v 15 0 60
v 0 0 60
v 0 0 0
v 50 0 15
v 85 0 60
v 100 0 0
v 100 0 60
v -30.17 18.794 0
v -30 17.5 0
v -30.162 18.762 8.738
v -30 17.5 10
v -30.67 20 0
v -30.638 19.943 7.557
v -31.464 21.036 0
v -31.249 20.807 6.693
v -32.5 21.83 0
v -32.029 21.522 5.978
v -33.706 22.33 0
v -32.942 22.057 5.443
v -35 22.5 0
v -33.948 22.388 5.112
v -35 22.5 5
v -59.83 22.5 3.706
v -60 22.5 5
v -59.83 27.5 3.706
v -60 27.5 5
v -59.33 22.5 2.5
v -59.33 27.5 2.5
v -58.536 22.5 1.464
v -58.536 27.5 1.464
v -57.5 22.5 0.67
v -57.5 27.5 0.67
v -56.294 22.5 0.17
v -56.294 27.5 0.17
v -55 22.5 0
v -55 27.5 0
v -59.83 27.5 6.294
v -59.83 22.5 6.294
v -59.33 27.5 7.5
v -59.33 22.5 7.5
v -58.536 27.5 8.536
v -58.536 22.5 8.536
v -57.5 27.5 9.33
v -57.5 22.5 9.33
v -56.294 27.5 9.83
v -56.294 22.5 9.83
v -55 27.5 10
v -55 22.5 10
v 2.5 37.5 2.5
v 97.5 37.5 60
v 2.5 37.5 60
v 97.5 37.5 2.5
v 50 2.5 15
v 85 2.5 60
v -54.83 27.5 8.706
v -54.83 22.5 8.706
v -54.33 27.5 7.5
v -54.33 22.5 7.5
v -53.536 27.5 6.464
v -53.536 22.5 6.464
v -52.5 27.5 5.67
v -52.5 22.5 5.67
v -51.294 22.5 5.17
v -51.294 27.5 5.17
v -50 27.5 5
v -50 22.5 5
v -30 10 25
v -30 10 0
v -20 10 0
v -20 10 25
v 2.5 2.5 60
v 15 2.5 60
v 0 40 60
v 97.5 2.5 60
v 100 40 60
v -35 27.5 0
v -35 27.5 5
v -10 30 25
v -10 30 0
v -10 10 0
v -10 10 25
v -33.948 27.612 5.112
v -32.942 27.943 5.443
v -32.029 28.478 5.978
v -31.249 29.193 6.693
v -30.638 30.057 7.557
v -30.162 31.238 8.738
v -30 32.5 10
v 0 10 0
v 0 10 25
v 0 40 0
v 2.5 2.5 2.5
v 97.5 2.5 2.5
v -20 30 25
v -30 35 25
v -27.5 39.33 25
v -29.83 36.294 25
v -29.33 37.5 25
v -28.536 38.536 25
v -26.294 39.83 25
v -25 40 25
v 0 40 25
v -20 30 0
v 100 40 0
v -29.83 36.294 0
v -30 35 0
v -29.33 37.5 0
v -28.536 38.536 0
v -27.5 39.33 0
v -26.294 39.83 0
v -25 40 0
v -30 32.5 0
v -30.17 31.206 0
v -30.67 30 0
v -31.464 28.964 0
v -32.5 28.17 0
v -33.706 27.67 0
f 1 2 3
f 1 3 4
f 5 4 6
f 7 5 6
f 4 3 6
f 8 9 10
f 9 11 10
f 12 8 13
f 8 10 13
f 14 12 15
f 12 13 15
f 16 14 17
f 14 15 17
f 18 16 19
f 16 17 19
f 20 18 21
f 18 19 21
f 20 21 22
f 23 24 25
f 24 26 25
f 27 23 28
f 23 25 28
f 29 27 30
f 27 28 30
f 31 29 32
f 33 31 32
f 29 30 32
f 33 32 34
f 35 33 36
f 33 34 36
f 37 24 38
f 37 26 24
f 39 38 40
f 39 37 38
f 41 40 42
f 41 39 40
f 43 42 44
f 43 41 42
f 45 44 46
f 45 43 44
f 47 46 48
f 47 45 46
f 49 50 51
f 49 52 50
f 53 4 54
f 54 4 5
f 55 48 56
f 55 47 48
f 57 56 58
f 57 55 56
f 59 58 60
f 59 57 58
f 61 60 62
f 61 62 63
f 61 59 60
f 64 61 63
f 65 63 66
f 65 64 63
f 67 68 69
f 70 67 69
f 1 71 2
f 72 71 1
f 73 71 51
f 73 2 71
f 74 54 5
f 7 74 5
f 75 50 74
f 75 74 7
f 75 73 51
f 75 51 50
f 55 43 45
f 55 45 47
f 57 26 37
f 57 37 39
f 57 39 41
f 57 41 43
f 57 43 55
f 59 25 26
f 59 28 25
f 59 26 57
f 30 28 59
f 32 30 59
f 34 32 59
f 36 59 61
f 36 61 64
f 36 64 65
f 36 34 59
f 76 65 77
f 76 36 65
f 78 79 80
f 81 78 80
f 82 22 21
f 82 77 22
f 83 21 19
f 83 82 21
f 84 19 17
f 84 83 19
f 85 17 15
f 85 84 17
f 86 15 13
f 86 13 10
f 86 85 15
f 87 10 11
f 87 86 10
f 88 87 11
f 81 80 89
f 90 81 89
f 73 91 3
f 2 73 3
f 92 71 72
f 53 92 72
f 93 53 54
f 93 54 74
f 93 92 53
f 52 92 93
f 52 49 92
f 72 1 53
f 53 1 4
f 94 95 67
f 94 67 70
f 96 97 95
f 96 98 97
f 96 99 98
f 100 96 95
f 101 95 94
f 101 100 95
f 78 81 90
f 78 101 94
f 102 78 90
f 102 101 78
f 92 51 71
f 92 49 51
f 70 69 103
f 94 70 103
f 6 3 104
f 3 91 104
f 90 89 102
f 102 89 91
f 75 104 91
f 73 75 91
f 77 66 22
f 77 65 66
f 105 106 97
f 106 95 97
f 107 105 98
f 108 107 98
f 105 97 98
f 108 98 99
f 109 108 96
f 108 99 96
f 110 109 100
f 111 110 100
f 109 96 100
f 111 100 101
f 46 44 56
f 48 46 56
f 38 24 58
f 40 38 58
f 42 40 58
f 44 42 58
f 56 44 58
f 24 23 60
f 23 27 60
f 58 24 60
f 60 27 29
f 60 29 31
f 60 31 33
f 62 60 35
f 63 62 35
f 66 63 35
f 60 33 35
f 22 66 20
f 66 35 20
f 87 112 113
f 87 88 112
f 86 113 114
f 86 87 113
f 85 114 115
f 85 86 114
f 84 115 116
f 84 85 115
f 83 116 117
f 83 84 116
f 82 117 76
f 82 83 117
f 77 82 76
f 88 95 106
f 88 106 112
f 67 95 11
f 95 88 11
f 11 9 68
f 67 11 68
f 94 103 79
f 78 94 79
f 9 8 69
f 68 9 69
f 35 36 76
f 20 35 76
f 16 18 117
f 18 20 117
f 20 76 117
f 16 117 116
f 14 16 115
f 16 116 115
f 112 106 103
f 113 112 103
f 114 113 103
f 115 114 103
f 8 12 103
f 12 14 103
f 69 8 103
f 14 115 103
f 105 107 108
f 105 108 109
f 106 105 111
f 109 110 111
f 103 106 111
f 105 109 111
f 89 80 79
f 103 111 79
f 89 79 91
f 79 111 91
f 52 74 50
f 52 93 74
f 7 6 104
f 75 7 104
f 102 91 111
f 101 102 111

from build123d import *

# Parameters (mm, degrees)
F1_DEPTH  = 60
F2_T      = -2.5
F3_DEPTH  = 25
F4_W      = 25
F4_H      = 5
F5_DEPTH  = 5
F4_W_2    = 5
F6_DEPTH  = 10
F7_R      = 4.99999
F8_R      = 5
F10_DEPTH = 25


# Not quite as in the source:
# - a fillet or chamfer is up to 0.001 mm smaller than in the source, because OpenCascade refuses the exact size


with BuildPart() as f1:
    # F0 (on Top) → F1 (new body)
    with BuildSketch(Plane.XY):
        Polygon((0, 10), (0, 0), (100, 0), (100, 40), (0, 40), align=None)
    extrude(amount=F1_DEPTH)

    # F2
    f2_openings = [f1.faces().sort_by_distance(p)[0] for p in [
        (50, 20, 60),
    ]]
    offset(amount=F2_T, openings=f2_openings)

    # F9 (on face) → F10 (cut)
    with BuildSketch(Plane.XZ):
        Polygon((85, 60), (15, 60), (50, 15), align=None)
    extrude(amount=-F10_DEPTH, mode=Mode.SUBTRACT)


with BuildPart() as f3:
    # F0 (on Top) → F3 (new body)
    with BuildSketch(Plane.XY):
        Polygon((-10, 10), (0, 10), (0, 40), (-30, 40), (-30, 10), (-20, 10), (-20, 30), (-10, 30), align=None)
    extrude(amount=F3_DEPTH)

    # F4 (on Top) → F5 (join)
    with BuildSketch(Plane.XY):
        with Locations((-42.5, 25)):
            Rectangle(F4_W, F4_H)
    extrude(amount=F5_DEPTH)

    # F4 (on Top) → F6 (join)
    with BuildSketch(Plane.XY):
        with Locations((-57.5, 25)):
            Rectangle(F4_W_2, F4_H)
    extrude(amount=F6_DEPTH)

    # F7 (radius 5 in the source; OpenCascade refuses exactly that, so slightly less here)
    f7_edges = [f3.edges().sort_by_distance(p)[0] for p in [
        (-30, 25, 5),
        (-30, 22.5, 2.5),
        (-30, 27.5, 2.5),
        (-55, 25, 5),
        (-60, 25, 0),
        (-60, 25, 10),
    ]]
    fillet(f7_edges, radius=F7_R)

    # F8
    f8_edges = [f3.edges().sort_by_distance(p)[0] for p in [
        (-30, 40, 12.5),
    ]]
    fillet(f8_edges, radius=F8_R)


solid = Compound([f1.part, f3.part])
